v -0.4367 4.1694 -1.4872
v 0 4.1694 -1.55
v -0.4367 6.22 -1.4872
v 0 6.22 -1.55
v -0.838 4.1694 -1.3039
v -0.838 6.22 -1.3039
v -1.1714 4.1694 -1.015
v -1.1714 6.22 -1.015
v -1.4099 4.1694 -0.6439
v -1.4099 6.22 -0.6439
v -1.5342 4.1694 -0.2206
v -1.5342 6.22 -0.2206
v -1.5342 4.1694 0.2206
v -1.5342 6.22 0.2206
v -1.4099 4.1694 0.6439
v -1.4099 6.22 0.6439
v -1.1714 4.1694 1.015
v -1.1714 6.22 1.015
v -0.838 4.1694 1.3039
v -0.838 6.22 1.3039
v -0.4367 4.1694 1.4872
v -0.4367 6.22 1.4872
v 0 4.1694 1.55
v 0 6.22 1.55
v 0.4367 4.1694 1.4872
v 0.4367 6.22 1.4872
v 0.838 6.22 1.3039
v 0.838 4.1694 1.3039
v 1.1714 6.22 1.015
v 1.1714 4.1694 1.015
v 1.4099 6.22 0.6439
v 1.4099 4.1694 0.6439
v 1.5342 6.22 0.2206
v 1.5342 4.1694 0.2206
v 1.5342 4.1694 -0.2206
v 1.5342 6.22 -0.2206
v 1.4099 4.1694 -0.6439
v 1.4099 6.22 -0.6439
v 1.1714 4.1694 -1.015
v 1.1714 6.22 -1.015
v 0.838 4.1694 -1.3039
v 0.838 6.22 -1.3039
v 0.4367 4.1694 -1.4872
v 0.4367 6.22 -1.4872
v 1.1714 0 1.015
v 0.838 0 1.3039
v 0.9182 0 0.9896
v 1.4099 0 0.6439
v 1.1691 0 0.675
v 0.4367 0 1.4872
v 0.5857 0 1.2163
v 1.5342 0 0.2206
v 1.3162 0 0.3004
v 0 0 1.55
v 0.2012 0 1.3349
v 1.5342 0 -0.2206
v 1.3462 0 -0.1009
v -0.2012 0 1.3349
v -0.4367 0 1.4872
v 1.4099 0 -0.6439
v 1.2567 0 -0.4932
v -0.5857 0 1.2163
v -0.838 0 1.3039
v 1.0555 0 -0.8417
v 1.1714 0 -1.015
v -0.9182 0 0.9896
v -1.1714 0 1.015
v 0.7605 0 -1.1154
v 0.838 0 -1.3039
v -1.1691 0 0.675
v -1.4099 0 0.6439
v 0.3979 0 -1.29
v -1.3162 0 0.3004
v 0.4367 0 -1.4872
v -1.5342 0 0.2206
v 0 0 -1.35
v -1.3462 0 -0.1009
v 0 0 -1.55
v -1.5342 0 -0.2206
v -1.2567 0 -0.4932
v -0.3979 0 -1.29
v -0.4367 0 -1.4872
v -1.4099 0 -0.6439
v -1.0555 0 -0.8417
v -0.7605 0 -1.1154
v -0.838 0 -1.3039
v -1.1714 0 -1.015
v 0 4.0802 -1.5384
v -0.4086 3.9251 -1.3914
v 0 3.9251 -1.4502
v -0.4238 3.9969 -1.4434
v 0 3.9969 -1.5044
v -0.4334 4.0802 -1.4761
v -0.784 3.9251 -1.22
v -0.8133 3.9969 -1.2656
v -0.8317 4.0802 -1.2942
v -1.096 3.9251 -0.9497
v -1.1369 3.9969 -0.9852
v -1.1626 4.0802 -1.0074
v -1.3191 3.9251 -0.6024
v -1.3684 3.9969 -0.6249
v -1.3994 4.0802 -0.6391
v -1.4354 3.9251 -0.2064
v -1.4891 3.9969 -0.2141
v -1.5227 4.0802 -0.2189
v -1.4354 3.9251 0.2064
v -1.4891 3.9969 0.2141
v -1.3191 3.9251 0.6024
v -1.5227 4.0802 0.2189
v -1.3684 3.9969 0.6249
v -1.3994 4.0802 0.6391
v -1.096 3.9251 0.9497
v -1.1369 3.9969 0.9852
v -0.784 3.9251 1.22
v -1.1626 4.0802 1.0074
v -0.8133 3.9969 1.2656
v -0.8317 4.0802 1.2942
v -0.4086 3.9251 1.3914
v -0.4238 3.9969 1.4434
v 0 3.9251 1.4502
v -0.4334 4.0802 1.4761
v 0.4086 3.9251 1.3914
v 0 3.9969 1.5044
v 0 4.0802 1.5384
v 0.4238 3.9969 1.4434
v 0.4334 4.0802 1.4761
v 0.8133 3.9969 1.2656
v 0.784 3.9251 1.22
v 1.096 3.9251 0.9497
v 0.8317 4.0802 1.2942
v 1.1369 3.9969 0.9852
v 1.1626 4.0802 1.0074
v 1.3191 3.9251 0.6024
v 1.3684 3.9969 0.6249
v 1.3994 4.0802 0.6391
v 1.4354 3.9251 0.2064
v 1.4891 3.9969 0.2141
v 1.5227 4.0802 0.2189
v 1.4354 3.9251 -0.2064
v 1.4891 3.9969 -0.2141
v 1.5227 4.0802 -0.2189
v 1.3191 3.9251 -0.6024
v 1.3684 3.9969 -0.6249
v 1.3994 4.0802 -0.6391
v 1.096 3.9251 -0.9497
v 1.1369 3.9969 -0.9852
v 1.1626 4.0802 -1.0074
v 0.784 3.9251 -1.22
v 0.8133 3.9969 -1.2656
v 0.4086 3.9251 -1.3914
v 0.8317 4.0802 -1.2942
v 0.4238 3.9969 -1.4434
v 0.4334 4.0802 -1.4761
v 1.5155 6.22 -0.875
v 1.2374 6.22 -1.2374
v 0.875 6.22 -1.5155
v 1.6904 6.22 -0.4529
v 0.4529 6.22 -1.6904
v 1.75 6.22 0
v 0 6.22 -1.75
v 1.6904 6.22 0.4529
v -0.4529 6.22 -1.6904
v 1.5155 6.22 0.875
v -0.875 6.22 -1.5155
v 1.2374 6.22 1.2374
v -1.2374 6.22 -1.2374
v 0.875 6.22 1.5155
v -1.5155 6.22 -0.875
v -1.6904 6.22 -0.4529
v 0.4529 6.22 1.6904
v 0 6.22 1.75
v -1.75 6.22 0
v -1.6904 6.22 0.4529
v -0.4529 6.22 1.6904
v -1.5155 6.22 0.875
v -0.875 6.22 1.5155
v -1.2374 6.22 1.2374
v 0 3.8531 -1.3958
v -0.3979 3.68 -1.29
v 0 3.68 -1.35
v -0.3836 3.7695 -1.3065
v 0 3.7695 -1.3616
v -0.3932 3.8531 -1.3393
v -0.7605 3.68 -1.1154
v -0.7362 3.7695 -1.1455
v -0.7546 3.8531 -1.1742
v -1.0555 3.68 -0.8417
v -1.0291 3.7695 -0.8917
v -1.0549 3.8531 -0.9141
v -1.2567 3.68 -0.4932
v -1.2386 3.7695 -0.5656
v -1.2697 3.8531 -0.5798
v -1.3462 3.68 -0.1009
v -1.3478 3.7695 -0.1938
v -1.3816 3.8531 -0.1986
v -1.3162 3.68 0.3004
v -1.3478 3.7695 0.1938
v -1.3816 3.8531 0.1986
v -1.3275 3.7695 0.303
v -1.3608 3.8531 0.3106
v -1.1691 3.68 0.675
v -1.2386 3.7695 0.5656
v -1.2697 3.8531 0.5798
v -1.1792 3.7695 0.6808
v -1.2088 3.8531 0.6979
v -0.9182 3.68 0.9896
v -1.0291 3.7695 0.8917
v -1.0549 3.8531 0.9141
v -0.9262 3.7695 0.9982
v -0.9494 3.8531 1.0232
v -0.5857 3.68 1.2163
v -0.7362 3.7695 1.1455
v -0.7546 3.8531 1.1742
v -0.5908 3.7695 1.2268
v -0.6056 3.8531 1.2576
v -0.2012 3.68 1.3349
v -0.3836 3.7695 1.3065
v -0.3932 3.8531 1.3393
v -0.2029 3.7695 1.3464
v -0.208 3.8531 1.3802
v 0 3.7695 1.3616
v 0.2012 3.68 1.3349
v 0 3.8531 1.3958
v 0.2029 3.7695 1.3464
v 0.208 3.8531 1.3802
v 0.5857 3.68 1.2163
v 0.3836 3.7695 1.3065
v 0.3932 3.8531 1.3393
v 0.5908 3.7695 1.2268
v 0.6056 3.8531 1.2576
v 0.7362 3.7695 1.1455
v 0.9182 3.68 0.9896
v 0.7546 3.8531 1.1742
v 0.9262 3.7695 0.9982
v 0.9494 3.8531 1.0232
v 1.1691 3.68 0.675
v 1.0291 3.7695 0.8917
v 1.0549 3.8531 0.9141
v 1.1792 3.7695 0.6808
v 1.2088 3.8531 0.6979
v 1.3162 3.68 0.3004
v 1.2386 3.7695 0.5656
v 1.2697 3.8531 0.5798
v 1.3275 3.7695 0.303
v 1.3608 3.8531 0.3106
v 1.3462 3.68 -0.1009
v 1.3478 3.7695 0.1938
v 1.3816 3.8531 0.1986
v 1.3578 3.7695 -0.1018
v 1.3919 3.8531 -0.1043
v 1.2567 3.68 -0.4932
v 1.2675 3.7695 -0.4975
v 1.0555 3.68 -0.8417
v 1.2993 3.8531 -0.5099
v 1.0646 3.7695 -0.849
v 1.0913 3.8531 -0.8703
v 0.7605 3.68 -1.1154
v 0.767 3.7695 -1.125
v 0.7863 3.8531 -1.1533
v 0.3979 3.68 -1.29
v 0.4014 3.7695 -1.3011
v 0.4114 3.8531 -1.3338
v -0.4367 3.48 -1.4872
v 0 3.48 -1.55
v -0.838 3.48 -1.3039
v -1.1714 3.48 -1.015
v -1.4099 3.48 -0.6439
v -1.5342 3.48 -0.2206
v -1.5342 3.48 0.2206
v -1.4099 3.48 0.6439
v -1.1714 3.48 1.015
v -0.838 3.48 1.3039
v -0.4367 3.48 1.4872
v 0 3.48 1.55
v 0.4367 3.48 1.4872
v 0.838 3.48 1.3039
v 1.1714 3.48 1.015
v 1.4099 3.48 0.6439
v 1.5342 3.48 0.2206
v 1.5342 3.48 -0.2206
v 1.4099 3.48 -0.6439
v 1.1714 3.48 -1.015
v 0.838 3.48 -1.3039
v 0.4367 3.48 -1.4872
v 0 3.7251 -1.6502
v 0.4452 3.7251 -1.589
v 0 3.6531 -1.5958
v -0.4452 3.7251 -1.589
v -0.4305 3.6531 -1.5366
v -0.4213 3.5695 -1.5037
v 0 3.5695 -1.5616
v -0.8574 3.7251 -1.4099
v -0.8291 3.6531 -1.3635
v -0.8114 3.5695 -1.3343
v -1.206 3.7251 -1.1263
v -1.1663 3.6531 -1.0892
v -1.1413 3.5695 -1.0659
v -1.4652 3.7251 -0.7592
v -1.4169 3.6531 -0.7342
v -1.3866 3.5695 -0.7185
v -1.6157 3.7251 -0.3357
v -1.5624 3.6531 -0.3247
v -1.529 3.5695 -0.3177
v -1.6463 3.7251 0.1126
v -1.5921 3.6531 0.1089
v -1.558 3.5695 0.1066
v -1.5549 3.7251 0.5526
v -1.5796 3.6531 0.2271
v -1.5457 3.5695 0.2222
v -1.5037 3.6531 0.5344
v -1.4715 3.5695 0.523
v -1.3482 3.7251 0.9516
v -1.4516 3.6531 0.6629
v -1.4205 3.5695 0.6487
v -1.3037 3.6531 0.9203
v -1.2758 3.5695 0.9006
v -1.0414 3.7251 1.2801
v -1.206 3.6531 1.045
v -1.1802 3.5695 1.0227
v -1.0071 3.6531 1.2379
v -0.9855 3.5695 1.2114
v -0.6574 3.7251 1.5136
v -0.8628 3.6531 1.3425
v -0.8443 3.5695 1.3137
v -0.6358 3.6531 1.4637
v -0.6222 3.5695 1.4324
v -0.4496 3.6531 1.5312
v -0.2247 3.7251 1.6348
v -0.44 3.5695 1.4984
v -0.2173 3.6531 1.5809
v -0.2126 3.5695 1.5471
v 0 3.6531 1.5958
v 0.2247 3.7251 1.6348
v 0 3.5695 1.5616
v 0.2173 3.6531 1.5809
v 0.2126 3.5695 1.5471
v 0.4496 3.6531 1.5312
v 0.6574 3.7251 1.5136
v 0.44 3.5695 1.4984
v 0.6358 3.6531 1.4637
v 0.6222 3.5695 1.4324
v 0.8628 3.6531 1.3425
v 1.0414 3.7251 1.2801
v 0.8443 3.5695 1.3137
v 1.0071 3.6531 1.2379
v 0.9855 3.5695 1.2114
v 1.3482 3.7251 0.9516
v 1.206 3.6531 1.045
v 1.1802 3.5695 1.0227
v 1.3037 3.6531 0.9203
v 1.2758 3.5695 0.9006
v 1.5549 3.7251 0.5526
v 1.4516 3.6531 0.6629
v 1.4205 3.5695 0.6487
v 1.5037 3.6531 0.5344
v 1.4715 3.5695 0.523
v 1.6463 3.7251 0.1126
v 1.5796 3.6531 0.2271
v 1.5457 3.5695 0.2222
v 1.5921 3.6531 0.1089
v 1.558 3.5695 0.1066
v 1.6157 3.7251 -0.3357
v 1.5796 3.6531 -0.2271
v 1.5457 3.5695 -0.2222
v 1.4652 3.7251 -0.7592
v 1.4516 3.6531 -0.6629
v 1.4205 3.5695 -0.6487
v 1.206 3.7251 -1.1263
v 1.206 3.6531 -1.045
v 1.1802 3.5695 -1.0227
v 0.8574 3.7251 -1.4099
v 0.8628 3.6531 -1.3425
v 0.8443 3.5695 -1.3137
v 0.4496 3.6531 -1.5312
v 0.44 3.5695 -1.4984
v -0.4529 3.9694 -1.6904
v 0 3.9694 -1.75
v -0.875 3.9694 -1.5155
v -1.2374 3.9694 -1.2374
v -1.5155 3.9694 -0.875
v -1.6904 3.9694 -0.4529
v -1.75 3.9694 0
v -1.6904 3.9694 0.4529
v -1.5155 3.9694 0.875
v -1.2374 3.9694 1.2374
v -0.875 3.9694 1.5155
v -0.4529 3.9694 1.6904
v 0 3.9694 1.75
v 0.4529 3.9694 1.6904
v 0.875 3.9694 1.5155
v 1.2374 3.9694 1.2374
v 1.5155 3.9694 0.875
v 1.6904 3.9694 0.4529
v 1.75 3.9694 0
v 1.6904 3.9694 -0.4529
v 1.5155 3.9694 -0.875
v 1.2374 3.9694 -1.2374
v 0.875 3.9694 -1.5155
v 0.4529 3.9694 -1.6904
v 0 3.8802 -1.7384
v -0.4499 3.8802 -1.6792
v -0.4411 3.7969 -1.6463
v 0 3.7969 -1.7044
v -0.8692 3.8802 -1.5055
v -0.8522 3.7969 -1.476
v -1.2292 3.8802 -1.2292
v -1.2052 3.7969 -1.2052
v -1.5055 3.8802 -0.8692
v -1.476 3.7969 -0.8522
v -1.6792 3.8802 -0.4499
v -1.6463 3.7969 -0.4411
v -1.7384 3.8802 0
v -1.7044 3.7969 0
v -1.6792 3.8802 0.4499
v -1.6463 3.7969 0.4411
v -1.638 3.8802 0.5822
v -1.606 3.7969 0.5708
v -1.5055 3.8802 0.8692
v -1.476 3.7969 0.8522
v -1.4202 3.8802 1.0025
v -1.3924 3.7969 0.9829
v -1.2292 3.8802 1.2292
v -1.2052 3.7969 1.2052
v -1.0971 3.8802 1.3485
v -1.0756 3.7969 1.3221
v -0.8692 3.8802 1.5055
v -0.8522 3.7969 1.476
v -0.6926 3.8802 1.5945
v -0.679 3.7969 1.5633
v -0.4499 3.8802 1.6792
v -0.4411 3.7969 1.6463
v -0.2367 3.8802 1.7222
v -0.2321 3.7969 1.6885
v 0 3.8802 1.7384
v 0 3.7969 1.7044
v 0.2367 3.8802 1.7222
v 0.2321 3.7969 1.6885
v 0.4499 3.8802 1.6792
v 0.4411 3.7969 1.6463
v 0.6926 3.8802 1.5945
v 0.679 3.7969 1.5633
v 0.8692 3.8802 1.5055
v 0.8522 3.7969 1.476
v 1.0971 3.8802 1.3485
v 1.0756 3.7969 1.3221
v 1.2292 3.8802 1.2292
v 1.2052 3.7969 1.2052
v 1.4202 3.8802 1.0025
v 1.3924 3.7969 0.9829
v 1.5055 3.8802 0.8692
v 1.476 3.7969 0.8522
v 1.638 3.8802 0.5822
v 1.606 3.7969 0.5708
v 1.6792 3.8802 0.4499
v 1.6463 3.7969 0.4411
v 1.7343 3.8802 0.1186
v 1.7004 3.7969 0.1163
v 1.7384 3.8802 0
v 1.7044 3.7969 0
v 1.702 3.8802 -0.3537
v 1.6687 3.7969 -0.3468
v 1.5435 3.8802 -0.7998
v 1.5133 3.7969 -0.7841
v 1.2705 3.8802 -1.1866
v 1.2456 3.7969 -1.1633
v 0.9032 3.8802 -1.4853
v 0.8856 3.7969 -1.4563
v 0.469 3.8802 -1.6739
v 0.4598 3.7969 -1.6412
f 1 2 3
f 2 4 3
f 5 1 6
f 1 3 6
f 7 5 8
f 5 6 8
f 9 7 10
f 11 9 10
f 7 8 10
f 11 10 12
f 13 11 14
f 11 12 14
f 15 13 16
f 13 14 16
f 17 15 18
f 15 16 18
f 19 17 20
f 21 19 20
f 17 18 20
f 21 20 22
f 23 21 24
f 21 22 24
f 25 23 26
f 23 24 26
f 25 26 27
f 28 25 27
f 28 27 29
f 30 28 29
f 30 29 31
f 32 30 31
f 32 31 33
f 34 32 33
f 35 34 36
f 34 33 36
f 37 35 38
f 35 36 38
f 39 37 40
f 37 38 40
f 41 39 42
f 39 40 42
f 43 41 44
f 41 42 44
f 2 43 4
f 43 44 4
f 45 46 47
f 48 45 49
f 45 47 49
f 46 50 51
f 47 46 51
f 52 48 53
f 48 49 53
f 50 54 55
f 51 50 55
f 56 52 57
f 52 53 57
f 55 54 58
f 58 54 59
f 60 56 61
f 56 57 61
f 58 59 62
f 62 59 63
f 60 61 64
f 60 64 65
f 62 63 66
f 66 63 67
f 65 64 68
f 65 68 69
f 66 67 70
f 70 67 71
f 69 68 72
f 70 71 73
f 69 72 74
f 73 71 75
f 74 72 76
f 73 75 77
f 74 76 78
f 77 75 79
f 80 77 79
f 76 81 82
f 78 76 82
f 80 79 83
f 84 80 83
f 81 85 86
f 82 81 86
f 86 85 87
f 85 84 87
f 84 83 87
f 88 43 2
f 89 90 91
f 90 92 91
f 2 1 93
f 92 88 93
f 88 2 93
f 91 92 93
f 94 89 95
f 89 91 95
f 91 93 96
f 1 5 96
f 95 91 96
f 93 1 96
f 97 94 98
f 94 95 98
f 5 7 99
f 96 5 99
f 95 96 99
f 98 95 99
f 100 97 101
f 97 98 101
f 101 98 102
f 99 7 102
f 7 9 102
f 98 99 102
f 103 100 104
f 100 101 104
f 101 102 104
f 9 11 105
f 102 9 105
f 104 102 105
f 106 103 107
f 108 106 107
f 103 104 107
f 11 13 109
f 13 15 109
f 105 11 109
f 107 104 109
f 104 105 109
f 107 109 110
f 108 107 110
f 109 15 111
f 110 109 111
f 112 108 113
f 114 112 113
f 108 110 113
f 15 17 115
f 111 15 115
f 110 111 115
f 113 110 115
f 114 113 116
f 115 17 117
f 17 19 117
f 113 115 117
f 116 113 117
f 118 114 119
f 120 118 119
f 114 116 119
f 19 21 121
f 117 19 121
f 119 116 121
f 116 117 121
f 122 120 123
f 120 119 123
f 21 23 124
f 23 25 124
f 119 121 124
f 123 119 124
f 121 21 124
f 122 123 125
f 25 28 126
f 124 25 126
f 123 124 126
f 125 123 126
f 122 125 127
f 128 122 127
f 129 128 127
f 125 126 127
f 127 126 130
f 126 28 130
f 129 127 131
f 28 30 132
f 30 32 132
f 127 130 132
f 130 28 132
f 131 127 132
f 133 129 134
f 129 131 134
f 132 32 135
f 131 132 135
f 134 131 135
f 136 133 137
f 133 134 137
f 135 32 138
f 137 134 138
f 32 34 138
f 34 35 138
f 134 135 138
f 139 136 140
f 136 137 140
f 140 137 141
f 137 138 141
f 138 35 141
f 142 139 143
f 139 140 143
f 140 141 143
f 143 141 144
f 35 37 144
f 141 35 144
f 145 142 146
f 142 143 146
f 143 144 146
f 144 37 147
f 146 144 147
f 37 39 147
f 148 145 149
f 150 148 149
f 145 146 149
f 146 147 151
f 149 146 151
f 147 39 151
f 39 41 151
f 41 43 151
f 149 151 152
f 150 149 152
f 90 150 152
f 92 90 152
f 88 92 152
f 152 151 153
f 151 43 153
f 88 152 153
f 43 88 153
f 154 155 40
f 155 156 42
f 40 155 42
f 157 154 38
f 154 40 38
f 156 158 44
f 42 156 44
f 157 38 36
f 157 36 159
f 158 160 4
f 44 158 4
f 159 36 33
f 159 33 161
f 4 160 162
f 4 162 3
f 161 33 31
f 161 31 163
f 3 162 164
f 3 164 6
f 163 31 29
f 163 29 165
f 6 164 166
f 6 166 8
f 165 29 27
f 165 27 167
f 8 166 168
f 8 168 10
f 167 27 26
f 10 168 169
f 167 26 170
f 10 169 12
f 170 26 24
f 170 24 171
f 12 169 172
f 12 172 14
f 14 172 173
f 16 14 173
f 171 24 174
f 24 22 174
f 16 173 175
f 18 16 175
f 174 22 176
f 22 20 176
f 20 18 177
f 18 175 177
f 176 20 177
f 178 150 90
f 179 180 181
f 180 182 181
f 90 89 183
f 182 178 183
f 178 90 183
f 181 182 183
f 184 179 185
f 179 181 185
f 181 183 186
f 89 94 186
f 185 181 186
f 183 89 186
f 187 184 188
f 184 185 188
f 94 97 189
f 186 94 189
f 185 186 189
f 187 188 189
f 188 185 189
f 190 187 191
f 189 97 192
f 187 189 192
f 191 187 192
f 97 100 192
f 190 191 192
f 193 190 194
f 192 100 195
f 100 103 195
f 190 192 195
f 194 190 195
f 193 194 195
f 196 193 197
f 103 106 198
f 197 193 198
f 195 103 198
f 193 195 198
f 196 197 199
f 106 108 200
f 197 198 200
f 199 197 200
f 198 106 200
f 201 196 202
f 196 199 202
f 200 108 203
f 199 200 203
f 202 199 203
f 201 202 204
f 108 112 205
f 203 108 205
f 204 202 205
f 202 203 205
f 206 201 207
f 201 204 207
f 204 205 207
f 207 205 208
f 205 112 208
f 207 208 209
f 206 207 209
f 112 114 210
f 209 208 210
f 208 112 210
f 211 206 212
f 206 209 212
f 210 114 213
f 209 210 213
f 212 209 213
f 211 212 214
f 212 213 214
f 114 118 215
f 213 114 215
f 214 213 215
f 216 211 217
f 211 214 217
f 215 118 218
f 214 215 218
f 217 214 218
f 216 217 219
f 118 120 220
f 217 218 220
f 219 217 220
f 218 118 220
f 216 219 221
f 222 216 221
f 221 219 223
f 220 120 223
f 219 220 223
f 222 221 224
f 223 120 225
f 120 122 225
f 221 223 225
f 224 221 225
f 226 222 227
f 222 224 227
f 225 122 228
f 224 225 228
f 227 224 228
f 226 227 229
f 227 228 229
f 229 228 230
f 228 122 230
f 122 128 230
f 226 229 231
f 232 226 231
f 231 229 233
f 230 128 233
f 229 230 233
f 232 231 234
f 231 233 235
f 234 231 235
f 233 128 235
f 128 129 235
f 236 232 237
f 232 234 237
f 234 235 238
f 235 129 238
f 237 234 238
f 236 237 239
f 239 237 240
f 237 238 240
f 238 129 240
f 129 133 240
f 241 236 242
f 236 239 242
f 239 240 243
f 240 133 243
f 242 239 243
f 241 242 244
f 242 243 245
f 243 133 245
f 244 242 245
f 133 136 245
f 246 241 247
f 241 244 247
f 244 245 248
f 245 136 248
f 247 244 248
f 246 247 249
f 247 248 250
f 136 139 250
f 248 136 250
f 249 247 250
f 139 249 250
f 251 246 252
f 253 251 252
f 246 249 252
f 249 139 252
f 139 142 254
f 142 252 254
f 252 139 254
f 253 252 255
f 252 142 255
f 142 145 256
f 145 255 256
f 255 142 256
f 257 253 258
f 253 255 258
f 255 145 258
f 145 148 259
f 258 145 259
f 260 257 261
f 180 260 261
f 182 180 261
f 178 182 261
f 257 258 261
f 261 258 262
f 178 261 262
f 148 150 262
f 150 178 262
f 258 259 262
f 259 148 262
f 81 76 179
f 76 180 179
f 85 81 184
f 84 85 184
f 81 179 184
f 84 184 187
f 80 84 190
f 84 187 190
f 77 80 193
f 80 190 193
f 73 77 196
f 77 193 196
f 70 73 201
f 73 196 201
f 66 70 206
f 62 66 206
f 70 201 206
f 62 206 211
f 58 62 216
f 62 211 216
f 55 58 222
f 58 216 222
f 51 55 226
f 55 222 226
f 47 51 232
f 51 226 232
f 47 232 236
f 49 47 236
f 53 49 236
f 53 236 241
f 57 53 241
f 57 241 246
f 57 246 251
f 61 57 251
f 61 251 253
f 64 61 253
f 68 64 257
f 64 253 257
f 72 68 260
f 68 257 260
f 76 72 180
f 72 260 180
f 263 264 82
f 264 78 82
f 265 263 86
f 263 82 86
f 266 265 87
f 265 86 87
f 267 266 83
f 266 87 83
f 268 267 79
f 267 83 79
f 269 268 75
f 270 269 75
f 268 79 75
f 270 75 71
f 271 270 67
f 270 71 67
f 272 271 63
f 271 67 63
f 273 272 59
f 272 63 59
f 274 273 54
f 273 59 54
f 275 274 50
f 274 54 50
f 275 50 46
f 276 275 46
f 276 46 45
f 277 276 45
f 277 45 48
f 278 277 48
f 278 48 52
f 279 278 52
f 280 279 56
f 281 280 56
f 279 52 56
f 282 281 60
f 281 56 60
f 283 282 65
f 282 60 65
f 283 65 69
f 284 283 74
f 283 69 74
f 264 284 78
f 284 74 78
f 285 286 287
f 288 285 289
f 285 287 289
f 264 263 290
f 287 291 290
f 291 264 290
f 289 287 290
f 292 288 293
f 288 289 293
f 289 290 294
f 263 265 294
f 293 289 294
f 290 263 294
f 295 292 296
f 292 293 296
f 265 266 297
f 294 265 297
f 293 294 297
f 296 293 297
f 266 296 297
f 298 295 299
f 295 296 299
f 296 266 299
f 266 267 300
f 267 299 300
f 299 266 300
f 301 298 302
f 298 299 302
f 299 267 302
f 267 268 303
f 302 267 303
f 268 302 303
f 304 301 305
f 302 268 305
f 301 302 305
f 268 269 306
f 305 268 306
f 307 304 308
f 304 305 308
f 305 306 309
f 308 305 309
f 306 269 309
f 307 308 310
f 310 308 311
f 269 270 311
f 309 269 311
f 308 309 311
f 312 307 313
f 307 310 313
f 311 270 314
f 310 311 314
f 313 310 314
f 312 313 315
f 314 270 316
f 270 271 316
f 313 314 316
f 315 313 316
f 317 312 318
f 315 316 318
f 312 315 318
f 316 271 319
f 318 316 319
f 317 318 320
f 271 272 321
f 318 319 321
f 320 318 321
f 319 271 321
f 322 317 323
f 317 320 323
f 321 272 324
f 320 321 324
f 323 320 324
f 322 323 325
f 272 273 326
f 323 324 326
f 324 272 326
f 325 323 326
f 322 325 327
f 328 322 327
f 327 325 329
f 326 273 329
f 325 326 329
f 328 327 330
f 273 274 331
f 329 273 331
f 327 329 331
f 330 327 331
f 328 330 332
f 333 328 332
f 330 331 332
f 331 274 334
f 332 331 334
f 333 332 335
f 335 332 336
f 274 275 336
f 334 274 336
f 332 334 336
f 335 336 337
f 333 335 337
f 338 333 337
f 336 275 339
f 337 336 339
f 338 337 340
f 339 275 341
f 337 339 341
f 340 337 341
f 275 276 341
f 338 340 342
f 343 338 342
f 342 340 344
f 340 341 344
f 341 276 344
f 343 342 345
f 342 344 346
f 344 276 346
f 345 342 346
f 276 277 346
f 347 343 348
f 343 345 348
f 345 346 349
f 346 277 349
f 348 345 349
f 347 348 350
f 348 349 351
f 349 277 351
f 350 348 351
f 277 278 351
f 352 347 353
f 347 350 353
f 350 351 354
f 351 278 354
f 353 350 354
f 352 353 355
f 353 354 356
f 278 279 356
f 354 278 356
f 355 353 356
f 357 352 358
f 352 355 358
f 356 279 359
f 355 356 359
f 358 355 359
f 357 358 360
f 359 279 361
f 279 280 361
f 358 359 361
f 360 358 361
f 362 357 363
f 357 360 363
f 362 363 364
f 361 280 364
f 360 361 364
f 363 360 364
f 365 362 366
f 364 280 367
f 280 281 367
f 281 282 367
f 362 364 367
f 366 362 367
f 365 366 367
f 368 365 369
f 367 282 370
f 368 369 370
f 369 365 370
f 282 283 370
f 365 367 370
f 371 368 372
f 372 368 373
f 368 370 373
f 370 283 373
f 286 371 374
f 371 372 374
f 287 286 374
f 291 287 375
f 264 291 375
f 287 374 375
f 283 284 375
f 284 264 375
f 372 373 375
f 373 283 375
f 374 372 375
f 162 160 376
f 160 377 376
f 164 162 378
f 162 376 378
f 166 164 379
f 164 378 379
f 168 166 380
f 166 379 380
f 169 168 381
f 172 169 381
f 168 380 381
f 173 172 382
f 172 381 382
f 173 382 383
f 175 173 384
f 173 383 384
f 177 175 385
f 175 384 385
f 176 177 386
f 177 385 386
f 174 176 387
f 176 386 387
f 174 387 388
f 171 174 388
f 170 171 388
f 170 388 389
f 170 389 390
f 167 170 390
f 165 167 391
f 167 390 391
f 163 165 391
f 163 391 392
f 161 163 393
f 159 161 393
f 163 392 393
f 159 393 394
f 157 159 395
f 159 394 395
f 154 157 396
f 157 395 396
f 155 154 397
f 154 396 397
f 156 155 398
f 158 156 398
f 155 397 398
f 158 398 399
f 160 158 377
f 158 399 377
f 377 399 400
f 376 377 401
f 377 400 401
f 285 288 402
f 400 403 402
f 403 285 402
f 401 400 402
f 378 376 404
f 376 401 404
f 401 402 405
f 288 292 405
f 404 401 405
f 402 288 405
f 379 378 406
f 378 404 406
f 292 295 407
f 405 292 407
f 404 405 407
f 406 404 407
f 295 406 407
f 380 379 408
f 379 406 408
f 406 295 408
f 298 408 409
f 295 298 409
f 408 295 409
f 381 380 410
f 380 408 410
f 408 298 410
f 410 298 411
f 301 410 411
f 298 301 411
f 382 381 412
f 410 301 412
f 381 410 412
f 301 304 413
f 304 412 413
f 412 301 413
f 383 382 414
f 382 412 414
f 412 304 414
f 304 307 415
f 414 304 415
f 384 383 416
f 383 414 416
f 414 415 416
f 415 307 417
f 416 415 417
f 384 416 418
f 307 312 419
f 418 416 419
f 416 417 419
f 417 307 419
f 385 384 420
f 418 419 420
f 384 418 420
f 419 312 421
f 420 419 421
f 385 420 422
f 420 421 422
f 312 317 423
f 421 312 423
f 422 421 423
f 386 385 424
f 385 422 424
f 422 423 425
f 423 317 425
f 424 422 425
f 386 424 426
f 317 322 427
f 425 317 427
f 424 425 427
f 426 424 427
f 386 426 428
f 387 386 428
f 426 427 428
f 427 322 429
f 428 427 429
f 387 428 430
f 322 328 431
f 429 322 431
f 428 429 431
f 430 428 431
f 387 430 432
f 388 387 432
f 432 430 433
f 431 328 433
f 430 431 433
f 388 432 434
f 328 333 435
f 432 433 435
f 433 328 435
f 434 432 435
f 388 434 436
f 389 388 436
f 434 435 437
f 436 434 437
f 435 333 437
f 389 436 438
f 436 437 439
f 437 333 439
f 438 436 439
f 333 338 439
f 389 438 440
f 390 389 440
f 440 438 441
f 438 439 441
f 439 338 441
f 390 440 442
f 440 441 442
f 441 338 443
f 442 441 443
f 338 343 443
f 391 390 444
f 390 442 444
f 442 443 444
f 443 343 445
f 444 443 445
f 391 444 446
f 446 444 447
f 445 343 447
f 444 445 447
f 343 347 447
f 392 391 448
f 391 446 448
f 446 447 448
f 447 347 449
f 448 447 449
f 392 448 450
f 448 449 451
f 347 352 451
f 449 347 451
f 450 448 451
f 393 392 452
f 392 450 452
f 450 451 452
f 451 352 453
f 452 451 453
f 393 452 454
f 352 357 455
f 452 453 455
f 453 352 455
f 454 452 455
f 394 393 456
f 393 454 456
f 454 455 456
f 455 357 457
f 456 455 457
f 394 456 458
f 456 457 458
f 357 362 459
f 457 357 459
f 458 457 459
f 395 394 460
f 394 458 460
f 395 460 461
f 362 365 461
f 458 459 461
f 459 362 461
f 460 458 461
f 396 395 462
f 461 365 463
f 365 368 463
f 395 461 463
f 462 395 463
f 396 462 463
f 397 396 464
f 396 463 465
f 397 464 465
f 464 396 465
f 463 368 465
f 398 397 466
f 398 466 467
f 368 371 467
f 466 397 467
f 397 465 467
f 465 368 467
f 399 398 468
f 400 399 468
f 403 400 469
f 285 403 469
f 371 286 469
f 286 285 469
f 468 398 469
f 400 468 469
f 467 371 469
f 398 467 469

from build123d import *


with BuildPart() as part:
    # Sketch1 → Revolve1 (revolve)
    with BuildSketch(Plane.XY, mode=Mode.PRIVATE) as revolve1_sk:
        with BuildLine():
            Line((-1.35, 0), (-1.35, 3.68))
            ThreePointArc((-1.35, 3.68), (-1.376012653, 3.812409209), (-1.450183993, 3.92513662))
            ThreePointArc((-1.450183993, 3.92513662), (-1.524082894, 4.037449972), (-1.55, 4.16937283))
            Line((-1.55, 4.16937283), (-1.55, 6.22))
            Line((-1.55, 6.22), (-1.75, 6.22))
            Line((-1.75, 6.22), (-1.75, 3.96937283))
            ThreePointArc((-1.75, 3.96937283), (-1.724082894, 3.837449972), (-1.650183993, 3.72513662))
            ThreePointArc((-1.650183993, 3.72513662), (-1.576012653, 3.612409209), (-1.55, 3.48))
            Line((-1.55, 3.48), (-1.55, 0))
            Line((-1.55, 0), (-1.35, 0))
        make_face()
    revolve(revolve1_sk.sketch.rotate(Axis((0, 0, 0), (0, 1, 0)), 270), axis=Axis((0, 0, 0), (0, 1, 0)))


solid = part.part
